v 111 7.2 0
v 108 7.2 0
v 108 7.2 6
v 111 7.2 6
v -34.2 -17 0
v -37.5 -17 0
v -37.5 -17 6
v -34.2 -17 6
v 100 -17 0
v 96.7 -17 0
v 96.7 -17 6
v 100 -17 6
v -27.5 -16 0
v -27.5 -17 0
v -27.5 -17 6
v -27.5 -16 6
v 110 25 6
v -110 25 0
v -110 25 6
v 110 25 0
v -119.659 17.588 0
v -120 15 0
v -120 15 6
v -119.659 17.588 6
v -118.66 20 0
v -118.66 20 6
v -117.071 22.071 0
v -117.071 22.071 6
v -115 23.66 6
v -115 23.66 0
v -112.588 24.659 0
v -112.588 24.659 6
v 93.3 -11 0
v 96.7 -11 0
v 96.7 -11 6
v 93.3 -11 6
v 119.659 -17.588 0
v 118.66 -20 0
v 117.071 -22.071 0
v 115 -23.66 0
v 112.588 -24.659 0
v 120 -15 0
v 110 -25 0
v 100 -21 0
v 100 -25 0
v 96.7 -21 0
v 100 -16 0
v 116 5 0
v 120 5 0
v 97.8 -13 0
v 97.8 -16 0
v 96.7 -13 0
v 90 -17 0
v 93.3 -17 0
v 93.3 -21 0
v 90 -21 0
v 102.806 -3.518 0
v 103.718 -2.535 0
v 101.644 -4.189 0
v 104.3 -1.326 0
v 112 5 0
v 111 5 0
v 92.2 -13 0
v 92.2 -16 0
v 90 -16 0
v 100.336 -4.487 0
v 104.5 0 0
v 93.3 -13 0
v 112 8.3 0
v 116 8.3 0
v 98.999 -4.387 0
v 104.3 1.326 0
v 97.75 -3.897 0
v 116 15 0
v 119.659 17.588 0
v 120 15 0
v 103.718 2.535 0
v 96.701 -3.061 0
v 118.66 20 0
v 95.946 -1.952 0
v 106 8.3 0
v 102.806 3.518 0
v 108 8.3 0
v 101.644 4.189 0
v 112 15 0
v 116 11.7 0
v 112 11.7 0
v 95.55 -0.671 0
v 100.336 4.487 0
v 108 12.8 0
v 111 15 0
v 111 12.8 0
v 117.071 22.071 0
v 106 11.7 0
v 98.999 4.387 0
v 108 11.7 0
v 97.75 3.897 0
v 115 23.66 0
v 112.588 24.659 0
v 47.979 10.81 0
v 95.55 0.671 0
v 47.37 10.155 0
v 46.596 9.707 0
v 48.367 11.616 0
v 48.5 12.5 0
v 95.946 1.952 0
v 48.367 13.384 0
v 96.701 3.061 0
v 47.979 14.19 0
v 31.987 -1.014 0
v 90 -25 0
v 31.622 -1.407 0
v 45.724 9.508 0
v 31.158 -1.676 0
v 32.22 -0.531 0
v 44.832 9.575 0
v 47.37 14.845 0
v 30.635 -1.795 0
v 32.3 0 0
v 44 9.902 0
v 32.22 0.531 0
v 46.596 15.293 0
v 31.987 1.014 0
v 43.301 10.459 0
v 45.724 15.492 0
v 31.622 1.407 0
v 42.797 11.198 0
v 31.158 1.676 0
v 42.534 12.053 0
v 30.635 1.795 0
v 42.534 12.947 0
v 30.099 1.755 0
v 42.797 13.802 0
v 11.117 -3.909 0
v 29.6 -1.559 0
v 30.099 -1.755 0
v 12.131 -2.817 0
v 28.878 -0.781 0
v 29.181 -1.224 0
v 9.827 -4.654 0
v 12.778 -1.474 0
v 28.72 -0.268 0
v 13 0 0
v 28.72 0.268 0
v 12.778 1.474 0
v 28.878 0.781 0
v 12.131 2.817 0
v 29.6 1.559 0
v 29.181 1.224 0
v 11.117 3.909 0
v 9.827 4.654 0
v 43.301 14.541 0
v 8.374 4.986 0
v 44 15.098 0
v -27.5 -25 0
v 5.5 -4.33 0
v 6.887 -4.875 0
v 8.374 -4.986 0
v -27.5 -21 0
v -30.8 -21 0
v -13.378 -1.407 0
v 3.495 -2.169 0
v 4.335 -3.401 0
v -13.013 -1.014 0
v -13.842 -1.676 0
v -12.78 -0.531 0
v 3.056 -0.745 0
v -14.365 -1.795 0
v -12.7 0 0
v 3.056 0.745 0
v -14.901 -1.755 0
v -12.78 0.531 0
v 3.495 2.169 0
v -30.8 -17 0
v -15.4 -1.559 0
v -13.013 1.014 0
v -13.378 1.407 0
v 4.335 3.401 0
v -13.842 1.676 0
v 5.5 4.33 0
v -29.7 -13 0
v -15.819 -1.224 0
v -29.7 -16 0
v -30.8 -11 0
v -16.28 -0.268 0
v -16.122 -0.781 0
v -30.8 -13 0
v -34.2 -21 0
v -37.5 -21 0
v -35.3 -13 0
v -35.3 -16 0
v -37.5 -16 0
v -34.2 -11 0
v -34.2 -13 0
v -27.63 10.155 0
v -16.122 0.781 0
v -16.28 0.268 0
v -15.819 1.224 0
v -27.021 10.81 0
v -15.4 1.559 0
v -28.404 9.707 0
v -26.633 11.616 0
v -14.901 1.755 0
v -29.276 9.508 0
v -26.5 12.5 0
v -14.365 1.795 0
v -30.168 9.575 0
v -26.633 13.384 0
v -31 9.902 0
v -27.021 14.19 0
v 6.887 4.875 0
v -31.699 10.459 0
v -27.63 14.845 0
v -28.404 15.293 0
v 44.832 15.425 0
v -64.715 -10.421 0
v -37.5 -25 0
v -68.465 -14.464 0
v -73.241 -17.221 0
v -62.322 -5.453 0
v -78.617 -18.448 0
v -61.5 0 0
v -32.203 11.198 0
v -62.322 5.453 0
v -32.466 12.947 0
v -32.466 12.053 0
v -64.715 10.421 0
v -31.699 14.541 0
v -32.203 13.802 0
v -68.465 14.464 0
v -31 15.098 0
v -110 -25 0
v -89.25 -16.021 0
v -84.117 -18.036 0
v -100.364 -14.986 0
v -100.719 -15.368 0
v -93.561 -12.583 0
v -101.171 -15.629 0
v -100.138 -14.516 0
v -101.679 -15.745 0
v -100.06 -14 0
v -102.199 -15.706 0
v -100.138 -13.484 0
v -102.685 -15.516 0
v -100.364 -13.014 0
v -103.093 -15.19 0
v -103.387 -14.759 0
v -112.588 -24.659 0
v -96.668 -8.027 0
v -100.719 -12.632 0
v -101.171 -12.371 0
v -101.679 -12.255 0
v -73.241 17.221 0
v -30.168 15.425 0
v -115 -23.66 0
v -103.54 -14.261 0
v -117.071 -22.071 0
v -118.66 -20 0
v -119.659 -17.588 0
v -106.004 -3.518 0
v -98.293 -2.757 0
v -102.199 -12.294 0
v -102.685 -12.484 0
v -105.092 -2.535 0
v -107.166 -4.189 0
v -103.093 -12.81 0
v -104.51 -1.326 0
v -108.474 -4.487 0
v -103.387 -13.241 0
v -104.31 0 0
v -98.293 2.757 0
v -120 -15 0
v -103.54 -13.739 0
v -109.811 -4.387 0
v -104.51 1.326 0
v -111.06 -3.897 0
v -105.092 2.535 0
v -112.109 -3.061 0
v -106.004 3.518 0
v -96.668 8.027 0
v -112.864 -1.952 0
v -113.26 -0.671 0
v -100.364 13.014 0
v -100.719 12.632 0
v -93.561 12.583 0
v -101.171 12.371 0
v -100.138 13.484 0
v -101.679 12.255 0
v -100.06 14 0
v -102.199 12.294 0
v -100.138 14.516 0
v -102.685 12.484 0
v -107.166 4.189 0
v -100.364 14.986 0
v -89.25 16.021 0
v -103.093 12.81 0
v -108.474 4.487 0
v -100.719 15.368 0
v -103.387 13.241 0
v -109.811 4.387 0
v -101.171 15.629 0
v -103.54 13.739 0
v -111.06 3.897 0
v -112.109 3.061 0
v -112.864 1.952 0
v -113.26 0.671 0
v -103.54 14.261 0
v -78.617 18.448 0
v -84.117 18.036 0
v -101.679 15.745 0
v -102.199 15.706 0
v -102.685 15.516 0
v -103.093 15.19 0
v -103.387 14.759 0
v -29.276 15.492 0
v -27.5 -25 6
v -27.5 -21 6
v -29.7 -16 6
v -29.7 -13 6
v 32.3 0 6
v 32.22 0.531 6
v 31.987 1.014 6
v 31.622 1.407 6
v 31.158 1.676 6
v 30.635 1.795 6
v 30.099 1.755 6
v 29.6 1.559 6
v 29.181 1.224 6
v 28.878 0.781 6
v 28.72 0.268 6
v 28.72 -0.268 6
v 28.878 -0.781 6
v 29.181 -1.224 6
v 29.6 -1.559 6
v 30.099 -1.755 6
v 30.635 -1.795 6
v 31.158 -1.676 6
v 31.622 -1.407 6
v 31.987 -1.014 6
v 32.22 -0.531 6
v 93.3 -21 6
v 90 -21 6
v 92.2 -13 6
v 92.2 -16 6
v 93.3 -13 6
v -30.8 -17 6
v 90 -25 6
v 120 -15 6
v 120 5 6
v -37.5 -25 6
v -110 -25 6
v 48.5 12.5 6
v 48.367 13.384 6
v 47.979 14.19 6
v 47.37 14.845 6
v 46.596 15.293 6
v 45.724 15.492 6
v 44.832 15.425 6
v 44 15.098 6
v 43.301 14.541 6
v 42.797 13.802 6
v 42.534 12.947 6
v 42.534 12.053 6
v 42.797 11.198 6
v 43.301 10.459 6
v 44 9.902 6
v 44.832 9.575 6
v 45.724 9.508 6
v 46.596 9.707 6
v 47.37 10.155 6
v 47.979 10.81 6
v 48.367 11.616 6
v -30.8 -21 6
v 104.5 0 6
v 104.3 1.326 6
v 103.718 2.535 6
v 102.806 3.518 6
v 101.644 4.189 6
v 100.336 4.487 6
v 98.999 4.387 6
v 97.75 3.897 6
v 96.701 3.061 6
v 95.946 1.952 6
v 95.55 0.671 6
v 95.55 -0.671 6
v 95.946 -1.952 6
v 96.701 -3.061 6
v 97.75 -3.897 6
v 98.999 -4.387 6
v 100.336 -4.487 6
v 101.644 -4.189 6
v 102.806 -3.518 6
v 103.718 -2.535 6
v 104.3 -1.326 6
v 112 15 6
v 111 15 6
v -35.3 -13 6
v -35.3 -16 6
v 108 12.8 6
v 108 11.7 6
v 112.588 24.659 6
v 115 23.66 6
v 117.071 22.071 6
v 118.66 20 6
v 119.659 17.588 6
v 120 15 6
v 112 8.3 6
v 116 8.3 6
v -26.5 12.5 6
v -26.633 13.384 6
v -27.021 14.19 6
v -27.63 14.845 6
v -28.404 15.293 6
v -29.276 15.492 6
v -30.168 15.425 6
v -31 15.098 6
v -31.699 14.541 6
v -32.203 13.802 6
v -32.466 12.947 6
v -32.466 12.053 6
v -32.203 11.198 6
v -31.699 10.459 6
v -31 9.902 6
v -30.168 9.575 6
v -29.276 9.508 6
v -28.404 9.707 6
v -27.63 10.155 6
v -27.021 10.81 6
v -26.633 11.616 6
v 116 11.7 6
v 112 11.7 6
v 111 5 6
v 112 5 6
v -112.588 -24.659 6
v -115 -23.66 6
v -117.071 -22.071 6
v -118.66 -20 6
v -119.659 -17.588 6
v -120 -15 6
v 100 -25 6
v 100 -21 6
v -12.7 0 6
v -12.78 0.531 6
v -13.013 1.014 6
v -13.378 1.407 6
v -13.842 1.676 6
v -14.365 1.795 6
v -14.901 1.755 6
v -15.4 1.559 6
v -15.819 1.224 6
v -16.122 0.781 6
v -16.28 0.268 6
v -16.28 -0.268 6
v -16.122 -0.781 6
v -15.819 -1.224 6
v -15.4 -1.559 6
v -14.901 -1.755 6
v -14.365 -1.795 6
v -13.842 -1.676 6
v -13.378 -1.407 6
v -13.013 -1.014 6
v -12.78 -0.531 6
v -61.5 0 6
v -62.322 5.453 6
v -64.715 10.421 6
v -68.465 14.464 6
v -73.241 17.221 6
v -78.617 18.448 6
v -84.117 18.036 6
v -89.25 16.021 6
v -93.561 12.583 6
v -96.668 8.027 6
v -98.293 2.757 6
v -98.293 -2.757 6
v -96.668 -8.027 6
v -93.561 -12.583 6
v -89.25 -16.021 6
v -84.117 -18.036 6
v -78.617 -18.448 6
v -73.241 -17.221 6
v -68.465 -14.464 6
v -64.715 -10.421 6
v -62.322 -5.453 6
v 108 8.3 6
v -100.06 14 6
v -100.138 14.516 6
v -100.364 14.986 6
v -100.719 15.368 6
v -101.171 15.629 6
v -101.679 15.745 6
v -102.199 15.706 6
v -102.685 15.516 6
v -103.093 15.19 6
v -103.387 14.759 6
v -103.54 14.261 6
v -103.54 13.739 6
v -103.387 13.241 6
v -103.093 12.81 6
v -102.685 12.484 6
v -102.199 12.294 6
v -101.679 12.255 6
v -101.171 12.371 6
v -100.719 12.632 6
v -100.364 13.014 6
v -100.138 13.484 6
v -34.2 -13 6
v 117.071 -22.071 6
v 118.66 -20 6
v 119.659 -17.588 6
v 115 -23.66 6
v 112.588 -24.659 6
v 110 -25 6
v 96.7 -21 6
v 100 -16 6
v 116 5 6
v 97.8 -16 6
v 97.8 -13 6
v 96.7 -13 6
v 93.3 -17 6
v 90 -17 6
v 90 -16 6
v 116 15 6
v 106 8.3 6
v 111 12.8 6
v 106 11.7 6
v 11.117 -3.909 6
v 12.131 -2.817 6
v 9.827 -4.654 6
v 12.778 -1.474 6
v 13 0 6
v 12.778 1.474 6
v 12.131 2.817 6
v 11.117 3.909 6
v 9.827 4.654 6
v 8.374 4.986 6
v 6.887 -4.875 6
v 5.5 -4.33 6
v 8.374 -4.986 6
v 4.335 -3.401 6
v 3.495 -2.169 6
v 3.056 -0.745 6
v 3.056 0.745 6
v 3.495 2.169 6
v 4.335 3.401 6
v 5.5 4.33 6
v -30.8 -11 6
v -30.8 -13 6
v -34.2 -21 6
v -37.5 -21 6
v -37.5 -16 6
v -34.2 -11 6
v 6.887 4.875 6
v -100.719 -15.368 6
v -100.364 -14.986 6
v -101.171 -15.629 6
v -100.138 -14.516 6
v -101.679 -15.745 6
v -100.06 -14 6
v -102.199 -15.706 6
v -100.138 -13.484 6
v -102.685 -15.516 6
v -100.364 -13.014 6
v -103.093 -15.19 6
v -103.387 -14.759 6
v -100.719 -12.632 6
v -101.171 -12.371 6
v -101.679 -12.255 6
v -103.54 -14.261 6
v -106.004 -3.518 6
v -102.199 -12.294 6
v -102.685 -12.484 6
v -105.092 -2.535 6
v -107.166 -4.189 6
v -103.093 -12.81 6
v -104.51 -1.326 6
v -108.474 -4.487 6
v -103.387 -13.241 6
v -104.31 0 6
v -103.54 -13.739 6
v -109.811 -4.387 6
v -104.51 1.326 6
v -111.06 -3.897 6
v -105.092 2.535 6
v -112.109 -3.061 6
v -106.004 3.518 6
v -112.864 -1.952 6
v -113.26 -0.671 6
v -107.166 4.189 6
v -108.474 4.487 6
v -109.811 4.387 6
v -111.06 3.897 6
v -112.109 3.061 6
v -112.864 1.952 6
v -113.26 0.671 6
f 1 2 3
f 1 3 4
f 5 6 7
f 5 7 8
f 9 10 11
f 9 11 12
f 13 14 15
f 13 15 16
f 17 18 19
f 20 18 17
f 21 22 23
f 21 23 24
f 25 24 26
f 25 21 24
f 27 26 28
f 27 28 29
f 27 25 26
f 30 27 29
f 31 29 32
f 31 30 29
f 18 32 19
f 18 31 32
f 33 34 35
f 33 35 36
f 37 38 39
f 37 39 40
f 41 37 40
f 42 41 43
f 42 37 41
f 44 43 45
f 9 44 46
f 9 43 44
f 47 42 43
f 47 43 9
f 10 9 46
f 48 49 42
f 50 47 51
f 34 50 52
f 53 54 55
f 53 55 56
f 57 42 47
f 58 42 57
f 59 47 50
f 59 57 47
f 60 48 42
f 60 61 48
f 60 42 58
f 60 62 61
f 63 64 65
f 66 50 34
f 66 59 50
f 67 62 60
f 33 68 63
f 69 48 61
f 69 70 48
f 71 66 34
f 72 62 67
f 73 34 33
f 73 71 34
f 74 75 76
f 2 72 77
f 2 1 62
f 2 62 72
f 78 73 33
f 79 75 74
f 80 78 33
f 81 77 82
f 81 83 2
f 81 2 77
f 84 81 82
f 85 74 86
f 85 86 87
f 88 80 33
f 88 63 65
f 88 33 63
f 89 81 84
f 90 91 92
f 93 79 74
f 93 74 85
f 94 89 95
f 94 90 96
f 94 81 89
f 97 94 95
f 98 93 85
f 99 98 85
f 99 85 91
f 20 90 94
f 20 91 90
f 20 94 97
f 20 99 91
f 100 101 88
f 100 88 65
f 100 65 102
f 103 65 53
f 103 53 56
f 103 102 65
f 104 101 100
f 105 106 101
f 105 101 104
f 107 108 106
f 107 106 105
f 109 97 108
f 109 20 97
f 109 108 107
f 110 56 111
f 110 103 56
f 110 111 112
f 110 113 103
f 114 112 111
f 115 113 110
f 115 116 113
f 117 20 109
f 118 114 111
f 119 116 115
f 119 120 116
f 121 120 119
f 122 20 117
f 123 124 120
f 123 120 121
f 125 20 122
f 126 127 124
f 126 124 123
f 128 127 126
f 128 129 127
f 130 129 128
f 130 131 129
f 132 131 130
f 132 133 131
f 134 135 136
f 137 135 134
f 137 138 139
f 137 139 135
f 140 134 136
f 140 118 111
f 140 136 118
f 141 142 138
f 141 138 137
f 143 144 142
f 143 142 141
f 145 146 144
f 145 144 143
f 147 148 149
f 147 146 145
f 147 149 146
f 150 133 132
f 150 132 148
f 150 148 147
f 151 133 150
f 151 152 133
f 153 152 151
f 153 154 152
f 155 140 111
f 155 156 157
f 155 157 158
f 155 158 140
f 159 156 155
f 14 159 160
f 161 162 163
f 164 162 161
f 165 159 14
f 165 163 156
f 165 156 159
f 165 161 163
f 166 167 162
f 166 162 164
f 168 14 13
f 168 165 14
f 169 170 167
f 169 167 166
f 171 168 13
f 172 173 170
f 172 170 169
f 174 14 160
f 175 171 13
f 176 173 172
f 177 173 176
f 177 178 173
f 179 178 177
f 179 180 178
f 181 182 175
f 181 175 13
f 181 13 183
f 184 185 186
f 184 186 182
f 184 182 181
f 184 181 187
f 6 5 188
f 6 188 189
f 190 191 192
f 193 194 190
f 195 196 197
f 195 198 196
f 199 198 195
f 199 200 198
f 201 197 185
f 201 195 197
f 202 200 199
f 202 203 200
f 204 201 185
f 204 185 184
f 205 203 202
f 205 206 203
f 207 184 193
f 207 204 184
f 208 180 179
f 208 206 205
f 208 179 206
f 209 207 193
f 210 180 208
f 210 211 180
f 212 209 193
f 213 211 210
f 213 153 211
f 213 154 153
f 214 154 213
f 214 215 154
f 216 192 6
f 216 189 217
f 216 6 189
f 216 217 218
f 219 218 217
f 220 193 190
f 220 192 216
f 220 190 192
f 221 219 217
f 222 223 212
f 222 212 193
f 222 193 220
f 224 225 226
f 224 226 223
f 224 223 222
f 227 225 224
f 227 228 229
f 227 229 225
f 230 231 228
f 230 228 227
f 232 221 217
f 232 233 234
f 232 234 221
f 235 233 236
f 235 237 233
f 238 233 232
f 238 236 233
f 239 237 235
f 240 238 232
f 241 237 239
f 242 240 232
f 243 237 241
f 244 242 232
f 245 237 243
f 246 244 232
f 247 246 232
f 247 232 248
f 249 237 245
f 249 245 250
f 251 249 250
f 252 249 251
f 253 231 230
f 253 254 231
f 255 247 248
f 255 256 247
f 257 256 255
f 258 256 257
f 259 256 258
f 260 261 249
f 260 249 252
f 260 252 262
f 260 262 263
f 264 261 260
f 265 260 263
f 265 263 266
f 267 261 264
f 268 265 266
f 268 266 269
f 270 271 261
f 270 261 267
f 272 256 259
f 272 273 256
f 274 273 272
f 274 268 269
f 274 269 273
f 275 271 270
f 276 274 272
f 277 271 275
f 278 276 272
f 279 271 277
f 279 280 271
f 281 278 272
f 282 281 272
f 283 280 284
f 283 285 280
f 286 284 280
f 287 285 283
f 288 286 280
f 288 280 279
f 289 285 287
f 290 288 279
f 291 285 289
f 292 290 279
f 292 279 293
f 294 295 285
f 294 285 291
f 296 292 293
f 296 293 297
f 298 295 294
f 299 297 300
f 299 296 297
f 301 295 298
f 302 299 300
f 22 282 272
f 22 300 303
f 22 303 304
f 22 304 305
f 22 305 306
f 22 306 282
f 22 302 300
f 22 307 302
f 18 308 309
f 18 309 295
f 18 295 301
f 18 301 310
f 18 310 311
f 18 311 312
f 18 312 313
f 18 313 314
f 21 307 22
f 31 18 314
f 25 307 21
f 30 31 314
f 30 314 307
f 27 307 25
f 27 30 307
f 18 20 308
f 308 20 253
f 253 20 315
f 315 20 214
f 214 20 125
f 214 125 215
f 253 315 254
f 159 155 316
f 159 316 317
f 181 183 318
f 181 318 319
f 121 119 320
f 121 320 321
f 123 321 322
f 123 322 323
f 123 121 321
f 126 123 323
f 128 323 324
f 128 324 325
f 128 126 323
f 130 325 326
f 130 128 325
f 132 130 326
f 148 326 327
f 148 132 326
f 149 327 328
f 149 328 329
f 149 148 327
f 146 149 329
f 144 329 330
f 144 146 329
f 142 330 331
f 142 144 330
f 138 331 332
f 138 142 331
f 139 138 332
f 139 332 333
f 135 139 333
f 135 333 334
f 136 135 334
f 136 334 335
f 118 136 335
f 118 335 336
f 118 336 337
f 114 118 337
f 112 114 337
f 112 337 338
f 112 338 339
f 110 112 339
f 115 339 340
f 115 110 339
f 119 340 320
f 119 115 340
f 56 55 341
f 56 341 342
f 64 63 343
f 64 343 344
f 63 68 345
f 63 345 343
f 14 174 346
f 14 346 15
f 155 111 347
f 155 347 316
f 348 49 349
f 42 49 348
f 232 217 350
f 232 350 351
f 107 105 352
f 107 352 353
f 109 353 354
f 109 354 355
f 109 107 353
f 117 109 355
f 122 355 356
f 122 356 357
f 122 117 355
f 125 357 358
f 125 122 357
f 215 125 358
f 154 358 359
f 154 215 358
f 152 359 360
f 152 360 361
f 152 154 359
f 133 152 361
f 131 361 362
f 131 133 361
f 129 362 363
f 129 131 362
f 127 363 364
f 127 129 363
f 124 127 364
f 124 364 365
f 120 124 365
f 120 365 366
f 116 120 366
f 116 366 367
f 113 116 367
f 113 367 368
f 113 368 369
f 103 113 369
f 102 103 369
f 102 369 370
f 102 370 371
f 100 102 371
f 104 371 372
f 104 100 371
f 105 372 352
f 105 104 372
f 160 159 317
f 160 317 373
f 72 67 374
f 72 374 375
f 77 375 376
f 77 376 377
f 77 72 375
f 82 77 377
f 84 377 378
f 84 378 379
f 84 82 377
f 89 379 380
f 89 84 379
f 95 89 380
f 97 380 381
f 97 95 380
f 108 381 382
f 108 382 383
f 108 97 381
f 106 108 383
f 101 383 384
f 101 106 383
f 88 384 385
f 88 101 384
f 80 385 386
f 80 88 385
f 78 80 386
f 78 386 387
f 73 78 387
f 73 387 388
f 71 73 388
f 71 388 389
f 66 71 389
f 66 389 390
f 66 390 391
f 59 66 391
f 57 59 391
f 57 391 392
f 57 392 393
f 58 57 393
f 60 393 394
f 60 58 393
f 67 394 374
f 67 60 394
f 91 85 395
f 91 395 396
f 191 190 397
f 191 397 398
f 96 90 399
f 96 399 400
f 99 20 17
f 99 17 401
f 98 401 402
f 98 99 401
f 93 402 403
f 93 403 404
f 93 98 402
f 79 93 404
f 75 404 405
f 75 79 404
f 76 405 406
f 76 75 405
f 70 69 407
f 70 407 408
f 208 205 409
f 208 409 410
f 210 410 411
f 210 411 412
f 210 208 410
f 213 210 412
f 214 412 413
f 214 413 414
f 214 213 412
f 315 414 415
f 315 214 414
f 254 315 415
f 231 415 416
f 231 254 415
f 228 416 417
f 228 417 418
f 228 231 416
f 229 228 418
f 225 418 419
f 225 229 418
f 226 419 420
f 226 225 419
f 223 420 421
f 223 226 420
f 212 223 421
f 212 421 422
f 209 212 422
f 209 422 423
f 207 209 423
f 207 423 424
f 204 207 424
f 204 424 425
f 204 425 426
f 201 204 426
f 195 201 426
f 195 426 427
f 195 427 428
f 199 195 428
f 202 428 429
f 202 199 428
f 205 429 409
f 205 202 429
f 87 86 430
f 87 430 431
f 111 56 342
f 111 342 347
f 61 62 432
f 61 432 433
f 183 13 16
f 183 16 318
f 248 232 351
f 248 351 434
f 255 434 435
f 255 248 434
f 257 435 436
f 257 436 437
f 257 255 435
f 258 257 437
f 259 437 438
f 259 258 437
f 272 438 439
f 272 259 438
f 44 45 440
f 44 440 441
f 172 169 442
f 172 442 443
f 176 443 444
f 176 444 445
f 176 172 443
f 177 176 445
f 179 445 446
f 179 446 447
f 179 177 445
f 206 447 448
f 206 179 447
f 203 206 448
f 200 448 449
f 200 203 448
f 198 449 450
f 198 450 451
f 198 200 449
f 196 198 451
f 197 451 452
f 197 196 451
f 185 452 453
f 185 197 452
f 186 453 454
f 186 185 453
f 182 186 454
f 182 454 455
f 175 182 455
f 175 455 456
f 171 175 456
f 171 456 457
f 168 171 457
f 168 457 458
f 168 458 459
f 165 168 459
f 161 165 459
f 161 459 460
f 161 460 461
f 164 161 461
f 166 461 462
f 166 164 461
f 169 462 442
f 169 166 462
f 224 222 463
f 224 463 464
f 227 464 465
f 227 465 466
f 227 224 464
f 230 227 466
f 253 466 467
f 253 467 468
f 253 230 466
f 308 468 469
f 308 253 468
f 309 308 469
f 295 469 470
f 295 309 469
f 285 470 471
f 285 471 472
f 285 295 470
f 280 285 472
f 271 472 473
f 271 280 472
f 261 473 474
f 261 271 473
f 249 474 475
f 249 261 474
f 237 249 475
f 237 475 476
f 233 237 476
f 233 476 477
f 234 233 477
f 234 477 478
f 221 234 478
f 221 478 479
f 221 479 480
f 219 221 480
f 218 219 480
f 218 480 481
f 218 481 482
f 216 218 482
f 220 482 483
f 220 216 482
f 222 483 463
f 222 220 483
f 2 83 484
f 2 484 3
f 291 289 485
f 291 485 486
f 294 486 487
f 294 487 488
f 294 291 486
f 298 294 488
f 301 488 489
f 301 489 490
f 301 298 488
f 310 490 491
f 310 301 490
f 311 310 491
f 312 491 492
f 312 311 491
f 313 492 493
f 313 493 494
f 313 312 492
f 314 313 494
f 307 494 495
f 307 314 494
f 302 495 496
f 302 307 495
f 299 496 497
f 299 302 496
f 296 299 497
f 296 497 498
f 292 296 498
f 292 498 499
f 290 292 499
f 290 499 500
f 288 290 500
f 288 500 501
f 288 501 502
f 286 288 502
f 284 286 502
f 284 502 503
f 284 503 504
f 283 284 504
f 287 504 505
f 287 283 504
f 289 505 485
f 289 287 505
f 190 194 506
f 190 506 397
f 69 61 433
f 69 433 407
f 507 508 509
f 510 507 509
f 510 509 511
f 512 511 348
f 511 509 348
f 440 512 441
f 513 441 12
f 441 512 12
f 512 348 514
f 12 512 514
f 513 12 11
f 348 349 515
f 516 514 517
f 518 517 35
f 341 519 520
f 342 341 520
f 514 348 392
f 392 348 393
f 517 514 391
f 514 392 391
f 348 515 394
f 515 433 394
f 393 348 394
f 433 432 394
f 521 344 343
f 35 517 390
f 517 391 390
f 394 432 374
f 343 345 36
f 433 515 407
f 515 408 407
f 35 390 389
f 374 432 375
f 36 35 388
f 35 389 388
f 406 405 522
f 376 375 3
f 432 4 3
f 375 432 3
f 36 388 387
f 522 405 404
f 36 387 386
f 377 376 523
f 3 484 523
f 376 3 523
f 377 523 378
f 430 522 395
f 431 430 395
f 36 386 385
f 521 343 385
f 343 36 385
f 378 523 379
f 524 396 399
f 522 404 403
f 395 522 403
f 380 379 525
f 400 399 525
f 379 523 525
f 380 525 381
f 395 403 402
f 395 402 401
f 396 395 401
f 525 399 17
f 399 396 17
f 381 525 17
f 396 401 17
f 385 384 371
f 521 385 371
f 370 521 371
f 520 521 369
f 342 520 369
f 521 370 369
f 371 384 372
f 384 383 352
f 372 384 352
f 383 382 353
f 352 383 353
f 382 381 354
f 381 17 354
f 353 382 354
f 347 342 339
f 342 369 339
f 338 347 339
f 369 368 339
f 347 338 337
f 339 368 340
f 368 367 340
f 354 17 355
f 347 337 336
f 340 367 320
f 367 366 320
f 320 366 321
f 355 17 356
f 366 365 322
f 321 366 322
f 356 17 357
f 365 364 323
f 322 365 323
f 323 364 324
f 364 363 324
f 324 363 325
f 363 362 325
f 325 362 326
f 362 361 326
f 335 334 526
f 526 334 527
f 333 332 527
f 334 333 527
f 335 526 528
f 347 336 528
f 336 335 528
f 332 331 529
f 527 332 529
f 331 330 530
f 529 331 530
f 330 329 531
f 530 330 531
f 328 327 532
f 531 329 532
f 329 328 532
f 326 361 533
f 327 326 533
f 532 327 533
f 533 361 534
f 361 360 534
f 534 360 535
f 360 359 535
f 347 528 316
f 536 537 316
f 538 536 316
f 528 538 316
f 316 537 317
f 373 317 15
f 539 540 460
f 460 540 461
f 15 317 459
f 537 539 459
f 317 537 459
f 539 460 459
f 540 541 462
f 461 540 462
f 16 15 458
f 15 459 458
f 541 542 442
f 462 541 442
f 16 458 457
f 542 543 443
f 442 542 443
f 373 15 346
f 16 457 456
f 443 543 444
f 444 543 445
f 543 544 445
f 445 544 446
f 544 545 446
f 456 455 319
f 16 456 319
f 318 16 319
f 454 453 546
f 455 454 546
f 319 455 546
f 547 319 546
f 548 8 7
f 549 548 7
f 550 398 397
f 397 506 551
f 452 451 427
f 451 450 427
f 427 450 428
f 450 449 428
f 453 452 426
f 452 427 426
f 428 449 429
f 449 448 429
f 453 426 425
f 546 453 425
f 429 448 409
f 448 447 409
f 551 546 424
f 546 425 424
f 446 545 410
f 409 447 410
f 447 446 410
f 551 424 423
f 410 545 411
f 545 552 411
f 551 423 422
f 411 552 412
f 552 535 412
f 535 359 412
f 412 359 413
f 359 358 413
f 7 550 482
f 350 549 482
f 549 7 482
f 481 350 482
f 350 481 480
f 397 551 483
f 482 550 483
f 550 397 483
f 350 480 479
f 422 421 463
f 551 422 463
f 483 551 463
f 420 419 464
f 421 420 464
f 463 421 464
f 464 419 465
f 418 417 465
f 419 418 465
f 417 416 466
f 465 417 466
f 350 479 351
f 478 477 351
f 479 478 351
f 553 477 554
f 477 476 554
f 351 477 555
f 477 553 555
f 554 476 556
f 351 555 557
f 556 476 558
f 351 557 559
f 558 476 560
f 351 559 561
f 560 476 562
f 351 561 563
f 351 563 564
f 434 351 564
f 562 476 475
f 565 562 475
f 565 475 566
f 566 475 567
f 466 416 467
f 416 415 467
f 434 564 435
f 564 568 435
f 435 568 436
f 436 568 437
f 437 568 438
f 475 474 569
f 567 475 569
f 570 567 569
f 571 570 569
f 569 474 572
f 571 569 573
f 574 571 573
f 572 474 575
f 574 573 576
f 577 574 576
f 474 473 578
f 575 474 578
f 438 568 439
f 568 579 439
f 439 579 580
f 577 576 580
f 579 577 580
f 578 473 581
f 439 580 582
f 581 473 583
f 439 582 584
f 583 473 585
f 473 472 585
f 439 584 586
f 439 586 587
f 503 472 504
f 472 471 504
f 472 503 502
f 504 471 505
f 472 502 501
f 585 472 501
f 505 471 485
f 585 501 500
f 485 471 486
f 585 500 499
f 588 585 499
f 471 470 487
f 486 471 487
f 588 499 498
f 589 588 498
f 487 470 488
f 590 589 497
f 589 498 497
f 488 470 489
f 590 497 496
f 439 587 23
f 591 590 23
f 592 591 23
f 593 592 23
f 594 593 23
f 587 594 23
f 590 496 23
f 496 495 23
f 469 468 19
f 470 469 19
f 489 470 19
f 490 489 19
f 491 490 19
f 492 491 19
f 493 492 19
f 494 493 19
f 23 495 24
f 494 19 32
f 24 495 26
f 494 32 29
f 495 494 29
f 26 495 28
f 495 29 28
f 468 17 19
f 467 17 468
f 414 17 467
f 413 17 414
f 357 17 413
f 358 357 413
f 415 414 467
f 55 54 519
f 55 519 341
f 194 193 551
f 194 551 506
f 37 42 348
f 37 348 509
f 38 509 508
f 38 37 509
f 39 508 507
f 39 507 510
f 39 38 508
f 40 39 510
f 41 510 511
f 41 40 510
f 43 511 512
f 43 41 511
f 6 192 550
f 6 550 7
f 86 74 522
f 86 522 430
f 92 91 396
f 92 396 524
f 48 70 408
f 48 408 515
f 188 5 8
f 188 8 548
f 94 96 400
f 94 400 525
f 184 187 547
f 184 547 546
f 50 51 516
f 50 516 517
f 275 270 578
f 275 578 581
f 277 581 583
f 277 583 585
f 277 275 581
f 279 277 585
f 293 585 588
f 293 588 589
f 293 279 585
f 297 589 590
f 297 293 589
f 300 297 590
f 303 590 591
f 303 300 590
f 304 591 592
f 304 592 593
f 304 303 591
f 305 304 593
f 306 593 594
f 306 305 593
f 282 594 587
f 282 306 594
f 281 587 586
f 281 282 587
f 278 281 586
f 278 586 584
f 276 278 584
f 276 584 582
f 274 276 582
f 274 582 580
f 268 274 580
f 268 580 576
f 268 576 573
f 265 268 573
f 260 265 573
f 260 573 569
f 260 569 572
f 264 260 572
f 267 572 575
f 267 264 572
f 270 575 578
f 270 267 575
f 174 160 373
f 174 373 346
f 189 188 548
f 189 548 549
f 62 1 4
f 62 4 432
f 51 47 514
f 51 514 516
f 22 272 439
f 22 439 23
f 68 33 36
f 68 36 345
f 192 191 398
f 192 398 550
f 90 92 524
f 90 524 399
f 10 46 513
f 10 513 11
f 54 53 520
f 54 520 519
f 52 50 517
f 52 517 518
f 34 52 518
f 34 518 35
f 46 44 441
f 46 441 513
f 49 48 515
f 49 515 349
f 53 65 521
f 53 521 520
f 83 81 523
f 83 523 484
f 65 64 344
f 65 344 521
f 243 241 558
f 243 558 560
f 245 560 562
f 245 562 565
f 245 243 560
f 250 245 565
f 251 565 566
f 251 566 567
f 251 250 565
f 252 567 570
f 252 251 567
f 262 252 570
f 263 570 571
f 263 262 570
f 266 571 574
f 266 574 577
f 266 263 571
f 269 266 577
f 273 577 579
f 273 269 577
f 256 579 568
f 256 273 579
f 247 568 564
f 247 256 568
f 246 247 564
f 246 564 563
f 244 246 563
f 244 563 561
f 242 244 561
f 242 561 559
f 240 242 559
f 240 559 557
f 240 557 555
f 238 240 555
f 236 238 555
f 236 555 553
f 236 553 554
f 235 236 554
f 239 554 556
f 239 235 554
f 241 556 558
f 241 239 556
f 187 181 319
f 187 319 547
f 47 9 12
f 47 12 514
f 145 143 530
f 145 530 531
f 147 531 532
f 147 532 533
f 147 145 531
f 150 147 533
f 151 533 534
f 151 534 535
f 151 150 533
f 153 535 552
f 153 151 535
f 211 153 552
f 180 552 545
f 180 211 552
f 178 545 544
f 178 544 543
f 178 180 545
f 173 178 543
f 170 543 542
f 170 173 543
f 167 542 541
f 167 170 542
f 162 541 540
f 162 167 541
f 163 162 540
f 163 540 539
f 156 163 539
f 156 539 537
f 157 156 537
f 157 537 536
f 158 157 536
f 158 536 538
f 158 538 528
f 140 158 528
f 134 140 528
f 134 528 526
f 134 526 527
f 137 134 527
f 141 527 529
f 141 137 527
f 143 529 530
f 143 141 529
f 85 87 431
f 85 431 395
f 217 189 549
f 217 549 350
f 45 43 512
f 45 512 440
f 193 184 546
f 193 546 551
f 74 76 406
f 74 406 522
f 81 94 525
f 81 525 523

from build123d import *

# Parameters (mm, degrees)
ESBO_O1_R                = 18.5
ESBO_O1_R_2              = 4.5
ESBO_O1_R_3              = 5
ESBO_O1_R_4              = 1.8
ESBO_O1_R_5              = 3
ESBO_O1_R_6              = 1.75
RESSALTO_EXTRUS_O1_DEPTH = 6


with BuildPart() as part:
    # Esboço1 → Ressalto-extrusão1 (new body)
    with BuildSketch(Plane.XY):
        with BuildLine():
            Line((100, -25), (100, -21))
            Line((100, -21), (96.7, -21))
            Line((96.7, -21), (96.7, -17))
            Line((96.7, -17), (100, -17))
            Line((100, -17), (100, -16))
            Line((100, -16), (97.8, -16))
            Line((97.8, -16), (97.8, -13))
            Line((97.8, -13), (96.7, -13))
            Line((96.7, -13), (96.7, -11))
            Line((96.7, -11), (93.3, -11))
            Line((93.3, -11), (93.3, -13))
            Line((93.3, -13), (92.2, -13))
            Line((92.2, -13), (92.2, -16))
            Line((92.2, -16), (90, -16))
            Line((90, -16), (90, -17))
            Line((90, -17), (93.3, -17))
            Line((93.3, -17), (93.3, -21))
            Line((93.3, -21), (90, -21))
            Line((90, -21), (90, -25))
            Line((90, -25), (-27.5, -25))
            Line((-27.5, -25), (-27.5, -21))
            Line((-27.5, -21), (-30.8, -21))
            Line((-30.8, -21), (-30.8, -17))
            Line((-30.8, -17), (-27.5, -17))
            Line((-27.5, -17), (-27.5, -16))
            Line((-27.5, -16), (-29.7, -16))
            Line((-29.7, -16), (-29.7, -13))
            Line((-29.7, -13), (-30.8, -13))
            Line((-30.8, -13), (-30.8, -11))
            Line((-30.8, -11), (-34.2, -11))
            Line((-34.2, -11), (-34.2, -13))
            Line((-34.2, -13), (-35.3, -13))
            Line((-35.3, -13), (-35.3, -16))
            Line((-35.3, -16), (-37.5, -16))
            Line((-37.5, -16), (-37.5, -17))
            Line((-37.5, -17), (-34.2, -17))
            Line((-34.2, -17), (-34.2, -21))
            Line((-34.2, -21), (-37.5, -21))
            Line((-37.5, -21), (-37.5, -25))
            Line((-37.5, -25), (-110, -25))
            ThreePointArc((-110, -25), (-117.071067812, -22.071067812), (-120, -15))
            Line((-120, -15), (-120, 15))
            ThreePointArc((-120, 15), (-117.071067812, 22.071067812), (-110, 25))
            Line((-110, 25), (110, 25))
            ThreePointArc((110, 25), (117.071067812, 22.071067812), (120, 15))
            Line((120, 15), (116, 15))
            Line((116, 15), (116, 11.7))
            Line((116, 11.7), (112, 11.7))
            Line((112, 11.7), (112, 15))
            Line((112, 15), (111, 15))
            Line((111, 15), (111, 12.8))
            Line((111, 12.8), (108, 12.8))
            Line((108, 12.8), (108, 11.7))
            Line((108, 11.7), (106, 11.7))
            Line((106, 11.7), (106, 8.3))
            Line((106, 8.3), (108, 8.3))
            Line((108, 8.3), (108, 7.2))
            Line((108, 7.2), (111, 7.2))
            Line((111, 7.2), (111, 5))
            Line((111, 5), (112, 5))
            Line((112, 5), (112, 8.3))
            Line((112, 8.3), (116, 8.3))
            Line((116, 8.3), (116, 5))
            Line((116, 5), (120, 5))
            Line((120, 5), (120, -15))
            ThreePointArc((120, -15), (117.071067812, -22.071067812), (110, -25))
            Line((110, -25), (100, -25))
        make_face()
        with Locations((-80, 0)):
            Circle(ESBO_O1_R, mode=Mode.SUBTRACT)
        with Locations((100, 0)):
            Circle(ESBO_O1_R_2, mode=Mode.SUBTRACT)
        with Locations((8, 0)):
            Circle(ESBO_O1_R_3, mode=Mode.SUBTRACT)
        with Locations((-108.81, 0)):
            Circle(ESBO_O1_R_2, mode=Mode.SUBTRACT)
        with Locations((-14.5, 0)):
            Circle(ESBO_O1_R_4, mode=Mode.SUBTRACT)
        with Locations((30.5, 0)):
            Circle(ESBO_O1_R_4, mode=Mode.SUBTRACT)
        with Locations((-29.5, 12.5)):
            Circle(ESBO_O1_R_5, mode=Mode.SUBTRACT)
        with Locations((45.5, 12.5)):
            Circle(ESBO_O1_R_5, mode=Mode.SUBTRACT)
        with Locations((-101.81, 14)):
            Circle(ESBO_O1_R_6, mode=Mode.SUBTRACT)
        with Locations((-101.81, -14)):
            Circle(ESBO_O1_R_6, mode=Mode.SUBTRACT)
    extrude(amount=RESSALTO_EXTRUS_O1_DEPTH)


solid = part.part
